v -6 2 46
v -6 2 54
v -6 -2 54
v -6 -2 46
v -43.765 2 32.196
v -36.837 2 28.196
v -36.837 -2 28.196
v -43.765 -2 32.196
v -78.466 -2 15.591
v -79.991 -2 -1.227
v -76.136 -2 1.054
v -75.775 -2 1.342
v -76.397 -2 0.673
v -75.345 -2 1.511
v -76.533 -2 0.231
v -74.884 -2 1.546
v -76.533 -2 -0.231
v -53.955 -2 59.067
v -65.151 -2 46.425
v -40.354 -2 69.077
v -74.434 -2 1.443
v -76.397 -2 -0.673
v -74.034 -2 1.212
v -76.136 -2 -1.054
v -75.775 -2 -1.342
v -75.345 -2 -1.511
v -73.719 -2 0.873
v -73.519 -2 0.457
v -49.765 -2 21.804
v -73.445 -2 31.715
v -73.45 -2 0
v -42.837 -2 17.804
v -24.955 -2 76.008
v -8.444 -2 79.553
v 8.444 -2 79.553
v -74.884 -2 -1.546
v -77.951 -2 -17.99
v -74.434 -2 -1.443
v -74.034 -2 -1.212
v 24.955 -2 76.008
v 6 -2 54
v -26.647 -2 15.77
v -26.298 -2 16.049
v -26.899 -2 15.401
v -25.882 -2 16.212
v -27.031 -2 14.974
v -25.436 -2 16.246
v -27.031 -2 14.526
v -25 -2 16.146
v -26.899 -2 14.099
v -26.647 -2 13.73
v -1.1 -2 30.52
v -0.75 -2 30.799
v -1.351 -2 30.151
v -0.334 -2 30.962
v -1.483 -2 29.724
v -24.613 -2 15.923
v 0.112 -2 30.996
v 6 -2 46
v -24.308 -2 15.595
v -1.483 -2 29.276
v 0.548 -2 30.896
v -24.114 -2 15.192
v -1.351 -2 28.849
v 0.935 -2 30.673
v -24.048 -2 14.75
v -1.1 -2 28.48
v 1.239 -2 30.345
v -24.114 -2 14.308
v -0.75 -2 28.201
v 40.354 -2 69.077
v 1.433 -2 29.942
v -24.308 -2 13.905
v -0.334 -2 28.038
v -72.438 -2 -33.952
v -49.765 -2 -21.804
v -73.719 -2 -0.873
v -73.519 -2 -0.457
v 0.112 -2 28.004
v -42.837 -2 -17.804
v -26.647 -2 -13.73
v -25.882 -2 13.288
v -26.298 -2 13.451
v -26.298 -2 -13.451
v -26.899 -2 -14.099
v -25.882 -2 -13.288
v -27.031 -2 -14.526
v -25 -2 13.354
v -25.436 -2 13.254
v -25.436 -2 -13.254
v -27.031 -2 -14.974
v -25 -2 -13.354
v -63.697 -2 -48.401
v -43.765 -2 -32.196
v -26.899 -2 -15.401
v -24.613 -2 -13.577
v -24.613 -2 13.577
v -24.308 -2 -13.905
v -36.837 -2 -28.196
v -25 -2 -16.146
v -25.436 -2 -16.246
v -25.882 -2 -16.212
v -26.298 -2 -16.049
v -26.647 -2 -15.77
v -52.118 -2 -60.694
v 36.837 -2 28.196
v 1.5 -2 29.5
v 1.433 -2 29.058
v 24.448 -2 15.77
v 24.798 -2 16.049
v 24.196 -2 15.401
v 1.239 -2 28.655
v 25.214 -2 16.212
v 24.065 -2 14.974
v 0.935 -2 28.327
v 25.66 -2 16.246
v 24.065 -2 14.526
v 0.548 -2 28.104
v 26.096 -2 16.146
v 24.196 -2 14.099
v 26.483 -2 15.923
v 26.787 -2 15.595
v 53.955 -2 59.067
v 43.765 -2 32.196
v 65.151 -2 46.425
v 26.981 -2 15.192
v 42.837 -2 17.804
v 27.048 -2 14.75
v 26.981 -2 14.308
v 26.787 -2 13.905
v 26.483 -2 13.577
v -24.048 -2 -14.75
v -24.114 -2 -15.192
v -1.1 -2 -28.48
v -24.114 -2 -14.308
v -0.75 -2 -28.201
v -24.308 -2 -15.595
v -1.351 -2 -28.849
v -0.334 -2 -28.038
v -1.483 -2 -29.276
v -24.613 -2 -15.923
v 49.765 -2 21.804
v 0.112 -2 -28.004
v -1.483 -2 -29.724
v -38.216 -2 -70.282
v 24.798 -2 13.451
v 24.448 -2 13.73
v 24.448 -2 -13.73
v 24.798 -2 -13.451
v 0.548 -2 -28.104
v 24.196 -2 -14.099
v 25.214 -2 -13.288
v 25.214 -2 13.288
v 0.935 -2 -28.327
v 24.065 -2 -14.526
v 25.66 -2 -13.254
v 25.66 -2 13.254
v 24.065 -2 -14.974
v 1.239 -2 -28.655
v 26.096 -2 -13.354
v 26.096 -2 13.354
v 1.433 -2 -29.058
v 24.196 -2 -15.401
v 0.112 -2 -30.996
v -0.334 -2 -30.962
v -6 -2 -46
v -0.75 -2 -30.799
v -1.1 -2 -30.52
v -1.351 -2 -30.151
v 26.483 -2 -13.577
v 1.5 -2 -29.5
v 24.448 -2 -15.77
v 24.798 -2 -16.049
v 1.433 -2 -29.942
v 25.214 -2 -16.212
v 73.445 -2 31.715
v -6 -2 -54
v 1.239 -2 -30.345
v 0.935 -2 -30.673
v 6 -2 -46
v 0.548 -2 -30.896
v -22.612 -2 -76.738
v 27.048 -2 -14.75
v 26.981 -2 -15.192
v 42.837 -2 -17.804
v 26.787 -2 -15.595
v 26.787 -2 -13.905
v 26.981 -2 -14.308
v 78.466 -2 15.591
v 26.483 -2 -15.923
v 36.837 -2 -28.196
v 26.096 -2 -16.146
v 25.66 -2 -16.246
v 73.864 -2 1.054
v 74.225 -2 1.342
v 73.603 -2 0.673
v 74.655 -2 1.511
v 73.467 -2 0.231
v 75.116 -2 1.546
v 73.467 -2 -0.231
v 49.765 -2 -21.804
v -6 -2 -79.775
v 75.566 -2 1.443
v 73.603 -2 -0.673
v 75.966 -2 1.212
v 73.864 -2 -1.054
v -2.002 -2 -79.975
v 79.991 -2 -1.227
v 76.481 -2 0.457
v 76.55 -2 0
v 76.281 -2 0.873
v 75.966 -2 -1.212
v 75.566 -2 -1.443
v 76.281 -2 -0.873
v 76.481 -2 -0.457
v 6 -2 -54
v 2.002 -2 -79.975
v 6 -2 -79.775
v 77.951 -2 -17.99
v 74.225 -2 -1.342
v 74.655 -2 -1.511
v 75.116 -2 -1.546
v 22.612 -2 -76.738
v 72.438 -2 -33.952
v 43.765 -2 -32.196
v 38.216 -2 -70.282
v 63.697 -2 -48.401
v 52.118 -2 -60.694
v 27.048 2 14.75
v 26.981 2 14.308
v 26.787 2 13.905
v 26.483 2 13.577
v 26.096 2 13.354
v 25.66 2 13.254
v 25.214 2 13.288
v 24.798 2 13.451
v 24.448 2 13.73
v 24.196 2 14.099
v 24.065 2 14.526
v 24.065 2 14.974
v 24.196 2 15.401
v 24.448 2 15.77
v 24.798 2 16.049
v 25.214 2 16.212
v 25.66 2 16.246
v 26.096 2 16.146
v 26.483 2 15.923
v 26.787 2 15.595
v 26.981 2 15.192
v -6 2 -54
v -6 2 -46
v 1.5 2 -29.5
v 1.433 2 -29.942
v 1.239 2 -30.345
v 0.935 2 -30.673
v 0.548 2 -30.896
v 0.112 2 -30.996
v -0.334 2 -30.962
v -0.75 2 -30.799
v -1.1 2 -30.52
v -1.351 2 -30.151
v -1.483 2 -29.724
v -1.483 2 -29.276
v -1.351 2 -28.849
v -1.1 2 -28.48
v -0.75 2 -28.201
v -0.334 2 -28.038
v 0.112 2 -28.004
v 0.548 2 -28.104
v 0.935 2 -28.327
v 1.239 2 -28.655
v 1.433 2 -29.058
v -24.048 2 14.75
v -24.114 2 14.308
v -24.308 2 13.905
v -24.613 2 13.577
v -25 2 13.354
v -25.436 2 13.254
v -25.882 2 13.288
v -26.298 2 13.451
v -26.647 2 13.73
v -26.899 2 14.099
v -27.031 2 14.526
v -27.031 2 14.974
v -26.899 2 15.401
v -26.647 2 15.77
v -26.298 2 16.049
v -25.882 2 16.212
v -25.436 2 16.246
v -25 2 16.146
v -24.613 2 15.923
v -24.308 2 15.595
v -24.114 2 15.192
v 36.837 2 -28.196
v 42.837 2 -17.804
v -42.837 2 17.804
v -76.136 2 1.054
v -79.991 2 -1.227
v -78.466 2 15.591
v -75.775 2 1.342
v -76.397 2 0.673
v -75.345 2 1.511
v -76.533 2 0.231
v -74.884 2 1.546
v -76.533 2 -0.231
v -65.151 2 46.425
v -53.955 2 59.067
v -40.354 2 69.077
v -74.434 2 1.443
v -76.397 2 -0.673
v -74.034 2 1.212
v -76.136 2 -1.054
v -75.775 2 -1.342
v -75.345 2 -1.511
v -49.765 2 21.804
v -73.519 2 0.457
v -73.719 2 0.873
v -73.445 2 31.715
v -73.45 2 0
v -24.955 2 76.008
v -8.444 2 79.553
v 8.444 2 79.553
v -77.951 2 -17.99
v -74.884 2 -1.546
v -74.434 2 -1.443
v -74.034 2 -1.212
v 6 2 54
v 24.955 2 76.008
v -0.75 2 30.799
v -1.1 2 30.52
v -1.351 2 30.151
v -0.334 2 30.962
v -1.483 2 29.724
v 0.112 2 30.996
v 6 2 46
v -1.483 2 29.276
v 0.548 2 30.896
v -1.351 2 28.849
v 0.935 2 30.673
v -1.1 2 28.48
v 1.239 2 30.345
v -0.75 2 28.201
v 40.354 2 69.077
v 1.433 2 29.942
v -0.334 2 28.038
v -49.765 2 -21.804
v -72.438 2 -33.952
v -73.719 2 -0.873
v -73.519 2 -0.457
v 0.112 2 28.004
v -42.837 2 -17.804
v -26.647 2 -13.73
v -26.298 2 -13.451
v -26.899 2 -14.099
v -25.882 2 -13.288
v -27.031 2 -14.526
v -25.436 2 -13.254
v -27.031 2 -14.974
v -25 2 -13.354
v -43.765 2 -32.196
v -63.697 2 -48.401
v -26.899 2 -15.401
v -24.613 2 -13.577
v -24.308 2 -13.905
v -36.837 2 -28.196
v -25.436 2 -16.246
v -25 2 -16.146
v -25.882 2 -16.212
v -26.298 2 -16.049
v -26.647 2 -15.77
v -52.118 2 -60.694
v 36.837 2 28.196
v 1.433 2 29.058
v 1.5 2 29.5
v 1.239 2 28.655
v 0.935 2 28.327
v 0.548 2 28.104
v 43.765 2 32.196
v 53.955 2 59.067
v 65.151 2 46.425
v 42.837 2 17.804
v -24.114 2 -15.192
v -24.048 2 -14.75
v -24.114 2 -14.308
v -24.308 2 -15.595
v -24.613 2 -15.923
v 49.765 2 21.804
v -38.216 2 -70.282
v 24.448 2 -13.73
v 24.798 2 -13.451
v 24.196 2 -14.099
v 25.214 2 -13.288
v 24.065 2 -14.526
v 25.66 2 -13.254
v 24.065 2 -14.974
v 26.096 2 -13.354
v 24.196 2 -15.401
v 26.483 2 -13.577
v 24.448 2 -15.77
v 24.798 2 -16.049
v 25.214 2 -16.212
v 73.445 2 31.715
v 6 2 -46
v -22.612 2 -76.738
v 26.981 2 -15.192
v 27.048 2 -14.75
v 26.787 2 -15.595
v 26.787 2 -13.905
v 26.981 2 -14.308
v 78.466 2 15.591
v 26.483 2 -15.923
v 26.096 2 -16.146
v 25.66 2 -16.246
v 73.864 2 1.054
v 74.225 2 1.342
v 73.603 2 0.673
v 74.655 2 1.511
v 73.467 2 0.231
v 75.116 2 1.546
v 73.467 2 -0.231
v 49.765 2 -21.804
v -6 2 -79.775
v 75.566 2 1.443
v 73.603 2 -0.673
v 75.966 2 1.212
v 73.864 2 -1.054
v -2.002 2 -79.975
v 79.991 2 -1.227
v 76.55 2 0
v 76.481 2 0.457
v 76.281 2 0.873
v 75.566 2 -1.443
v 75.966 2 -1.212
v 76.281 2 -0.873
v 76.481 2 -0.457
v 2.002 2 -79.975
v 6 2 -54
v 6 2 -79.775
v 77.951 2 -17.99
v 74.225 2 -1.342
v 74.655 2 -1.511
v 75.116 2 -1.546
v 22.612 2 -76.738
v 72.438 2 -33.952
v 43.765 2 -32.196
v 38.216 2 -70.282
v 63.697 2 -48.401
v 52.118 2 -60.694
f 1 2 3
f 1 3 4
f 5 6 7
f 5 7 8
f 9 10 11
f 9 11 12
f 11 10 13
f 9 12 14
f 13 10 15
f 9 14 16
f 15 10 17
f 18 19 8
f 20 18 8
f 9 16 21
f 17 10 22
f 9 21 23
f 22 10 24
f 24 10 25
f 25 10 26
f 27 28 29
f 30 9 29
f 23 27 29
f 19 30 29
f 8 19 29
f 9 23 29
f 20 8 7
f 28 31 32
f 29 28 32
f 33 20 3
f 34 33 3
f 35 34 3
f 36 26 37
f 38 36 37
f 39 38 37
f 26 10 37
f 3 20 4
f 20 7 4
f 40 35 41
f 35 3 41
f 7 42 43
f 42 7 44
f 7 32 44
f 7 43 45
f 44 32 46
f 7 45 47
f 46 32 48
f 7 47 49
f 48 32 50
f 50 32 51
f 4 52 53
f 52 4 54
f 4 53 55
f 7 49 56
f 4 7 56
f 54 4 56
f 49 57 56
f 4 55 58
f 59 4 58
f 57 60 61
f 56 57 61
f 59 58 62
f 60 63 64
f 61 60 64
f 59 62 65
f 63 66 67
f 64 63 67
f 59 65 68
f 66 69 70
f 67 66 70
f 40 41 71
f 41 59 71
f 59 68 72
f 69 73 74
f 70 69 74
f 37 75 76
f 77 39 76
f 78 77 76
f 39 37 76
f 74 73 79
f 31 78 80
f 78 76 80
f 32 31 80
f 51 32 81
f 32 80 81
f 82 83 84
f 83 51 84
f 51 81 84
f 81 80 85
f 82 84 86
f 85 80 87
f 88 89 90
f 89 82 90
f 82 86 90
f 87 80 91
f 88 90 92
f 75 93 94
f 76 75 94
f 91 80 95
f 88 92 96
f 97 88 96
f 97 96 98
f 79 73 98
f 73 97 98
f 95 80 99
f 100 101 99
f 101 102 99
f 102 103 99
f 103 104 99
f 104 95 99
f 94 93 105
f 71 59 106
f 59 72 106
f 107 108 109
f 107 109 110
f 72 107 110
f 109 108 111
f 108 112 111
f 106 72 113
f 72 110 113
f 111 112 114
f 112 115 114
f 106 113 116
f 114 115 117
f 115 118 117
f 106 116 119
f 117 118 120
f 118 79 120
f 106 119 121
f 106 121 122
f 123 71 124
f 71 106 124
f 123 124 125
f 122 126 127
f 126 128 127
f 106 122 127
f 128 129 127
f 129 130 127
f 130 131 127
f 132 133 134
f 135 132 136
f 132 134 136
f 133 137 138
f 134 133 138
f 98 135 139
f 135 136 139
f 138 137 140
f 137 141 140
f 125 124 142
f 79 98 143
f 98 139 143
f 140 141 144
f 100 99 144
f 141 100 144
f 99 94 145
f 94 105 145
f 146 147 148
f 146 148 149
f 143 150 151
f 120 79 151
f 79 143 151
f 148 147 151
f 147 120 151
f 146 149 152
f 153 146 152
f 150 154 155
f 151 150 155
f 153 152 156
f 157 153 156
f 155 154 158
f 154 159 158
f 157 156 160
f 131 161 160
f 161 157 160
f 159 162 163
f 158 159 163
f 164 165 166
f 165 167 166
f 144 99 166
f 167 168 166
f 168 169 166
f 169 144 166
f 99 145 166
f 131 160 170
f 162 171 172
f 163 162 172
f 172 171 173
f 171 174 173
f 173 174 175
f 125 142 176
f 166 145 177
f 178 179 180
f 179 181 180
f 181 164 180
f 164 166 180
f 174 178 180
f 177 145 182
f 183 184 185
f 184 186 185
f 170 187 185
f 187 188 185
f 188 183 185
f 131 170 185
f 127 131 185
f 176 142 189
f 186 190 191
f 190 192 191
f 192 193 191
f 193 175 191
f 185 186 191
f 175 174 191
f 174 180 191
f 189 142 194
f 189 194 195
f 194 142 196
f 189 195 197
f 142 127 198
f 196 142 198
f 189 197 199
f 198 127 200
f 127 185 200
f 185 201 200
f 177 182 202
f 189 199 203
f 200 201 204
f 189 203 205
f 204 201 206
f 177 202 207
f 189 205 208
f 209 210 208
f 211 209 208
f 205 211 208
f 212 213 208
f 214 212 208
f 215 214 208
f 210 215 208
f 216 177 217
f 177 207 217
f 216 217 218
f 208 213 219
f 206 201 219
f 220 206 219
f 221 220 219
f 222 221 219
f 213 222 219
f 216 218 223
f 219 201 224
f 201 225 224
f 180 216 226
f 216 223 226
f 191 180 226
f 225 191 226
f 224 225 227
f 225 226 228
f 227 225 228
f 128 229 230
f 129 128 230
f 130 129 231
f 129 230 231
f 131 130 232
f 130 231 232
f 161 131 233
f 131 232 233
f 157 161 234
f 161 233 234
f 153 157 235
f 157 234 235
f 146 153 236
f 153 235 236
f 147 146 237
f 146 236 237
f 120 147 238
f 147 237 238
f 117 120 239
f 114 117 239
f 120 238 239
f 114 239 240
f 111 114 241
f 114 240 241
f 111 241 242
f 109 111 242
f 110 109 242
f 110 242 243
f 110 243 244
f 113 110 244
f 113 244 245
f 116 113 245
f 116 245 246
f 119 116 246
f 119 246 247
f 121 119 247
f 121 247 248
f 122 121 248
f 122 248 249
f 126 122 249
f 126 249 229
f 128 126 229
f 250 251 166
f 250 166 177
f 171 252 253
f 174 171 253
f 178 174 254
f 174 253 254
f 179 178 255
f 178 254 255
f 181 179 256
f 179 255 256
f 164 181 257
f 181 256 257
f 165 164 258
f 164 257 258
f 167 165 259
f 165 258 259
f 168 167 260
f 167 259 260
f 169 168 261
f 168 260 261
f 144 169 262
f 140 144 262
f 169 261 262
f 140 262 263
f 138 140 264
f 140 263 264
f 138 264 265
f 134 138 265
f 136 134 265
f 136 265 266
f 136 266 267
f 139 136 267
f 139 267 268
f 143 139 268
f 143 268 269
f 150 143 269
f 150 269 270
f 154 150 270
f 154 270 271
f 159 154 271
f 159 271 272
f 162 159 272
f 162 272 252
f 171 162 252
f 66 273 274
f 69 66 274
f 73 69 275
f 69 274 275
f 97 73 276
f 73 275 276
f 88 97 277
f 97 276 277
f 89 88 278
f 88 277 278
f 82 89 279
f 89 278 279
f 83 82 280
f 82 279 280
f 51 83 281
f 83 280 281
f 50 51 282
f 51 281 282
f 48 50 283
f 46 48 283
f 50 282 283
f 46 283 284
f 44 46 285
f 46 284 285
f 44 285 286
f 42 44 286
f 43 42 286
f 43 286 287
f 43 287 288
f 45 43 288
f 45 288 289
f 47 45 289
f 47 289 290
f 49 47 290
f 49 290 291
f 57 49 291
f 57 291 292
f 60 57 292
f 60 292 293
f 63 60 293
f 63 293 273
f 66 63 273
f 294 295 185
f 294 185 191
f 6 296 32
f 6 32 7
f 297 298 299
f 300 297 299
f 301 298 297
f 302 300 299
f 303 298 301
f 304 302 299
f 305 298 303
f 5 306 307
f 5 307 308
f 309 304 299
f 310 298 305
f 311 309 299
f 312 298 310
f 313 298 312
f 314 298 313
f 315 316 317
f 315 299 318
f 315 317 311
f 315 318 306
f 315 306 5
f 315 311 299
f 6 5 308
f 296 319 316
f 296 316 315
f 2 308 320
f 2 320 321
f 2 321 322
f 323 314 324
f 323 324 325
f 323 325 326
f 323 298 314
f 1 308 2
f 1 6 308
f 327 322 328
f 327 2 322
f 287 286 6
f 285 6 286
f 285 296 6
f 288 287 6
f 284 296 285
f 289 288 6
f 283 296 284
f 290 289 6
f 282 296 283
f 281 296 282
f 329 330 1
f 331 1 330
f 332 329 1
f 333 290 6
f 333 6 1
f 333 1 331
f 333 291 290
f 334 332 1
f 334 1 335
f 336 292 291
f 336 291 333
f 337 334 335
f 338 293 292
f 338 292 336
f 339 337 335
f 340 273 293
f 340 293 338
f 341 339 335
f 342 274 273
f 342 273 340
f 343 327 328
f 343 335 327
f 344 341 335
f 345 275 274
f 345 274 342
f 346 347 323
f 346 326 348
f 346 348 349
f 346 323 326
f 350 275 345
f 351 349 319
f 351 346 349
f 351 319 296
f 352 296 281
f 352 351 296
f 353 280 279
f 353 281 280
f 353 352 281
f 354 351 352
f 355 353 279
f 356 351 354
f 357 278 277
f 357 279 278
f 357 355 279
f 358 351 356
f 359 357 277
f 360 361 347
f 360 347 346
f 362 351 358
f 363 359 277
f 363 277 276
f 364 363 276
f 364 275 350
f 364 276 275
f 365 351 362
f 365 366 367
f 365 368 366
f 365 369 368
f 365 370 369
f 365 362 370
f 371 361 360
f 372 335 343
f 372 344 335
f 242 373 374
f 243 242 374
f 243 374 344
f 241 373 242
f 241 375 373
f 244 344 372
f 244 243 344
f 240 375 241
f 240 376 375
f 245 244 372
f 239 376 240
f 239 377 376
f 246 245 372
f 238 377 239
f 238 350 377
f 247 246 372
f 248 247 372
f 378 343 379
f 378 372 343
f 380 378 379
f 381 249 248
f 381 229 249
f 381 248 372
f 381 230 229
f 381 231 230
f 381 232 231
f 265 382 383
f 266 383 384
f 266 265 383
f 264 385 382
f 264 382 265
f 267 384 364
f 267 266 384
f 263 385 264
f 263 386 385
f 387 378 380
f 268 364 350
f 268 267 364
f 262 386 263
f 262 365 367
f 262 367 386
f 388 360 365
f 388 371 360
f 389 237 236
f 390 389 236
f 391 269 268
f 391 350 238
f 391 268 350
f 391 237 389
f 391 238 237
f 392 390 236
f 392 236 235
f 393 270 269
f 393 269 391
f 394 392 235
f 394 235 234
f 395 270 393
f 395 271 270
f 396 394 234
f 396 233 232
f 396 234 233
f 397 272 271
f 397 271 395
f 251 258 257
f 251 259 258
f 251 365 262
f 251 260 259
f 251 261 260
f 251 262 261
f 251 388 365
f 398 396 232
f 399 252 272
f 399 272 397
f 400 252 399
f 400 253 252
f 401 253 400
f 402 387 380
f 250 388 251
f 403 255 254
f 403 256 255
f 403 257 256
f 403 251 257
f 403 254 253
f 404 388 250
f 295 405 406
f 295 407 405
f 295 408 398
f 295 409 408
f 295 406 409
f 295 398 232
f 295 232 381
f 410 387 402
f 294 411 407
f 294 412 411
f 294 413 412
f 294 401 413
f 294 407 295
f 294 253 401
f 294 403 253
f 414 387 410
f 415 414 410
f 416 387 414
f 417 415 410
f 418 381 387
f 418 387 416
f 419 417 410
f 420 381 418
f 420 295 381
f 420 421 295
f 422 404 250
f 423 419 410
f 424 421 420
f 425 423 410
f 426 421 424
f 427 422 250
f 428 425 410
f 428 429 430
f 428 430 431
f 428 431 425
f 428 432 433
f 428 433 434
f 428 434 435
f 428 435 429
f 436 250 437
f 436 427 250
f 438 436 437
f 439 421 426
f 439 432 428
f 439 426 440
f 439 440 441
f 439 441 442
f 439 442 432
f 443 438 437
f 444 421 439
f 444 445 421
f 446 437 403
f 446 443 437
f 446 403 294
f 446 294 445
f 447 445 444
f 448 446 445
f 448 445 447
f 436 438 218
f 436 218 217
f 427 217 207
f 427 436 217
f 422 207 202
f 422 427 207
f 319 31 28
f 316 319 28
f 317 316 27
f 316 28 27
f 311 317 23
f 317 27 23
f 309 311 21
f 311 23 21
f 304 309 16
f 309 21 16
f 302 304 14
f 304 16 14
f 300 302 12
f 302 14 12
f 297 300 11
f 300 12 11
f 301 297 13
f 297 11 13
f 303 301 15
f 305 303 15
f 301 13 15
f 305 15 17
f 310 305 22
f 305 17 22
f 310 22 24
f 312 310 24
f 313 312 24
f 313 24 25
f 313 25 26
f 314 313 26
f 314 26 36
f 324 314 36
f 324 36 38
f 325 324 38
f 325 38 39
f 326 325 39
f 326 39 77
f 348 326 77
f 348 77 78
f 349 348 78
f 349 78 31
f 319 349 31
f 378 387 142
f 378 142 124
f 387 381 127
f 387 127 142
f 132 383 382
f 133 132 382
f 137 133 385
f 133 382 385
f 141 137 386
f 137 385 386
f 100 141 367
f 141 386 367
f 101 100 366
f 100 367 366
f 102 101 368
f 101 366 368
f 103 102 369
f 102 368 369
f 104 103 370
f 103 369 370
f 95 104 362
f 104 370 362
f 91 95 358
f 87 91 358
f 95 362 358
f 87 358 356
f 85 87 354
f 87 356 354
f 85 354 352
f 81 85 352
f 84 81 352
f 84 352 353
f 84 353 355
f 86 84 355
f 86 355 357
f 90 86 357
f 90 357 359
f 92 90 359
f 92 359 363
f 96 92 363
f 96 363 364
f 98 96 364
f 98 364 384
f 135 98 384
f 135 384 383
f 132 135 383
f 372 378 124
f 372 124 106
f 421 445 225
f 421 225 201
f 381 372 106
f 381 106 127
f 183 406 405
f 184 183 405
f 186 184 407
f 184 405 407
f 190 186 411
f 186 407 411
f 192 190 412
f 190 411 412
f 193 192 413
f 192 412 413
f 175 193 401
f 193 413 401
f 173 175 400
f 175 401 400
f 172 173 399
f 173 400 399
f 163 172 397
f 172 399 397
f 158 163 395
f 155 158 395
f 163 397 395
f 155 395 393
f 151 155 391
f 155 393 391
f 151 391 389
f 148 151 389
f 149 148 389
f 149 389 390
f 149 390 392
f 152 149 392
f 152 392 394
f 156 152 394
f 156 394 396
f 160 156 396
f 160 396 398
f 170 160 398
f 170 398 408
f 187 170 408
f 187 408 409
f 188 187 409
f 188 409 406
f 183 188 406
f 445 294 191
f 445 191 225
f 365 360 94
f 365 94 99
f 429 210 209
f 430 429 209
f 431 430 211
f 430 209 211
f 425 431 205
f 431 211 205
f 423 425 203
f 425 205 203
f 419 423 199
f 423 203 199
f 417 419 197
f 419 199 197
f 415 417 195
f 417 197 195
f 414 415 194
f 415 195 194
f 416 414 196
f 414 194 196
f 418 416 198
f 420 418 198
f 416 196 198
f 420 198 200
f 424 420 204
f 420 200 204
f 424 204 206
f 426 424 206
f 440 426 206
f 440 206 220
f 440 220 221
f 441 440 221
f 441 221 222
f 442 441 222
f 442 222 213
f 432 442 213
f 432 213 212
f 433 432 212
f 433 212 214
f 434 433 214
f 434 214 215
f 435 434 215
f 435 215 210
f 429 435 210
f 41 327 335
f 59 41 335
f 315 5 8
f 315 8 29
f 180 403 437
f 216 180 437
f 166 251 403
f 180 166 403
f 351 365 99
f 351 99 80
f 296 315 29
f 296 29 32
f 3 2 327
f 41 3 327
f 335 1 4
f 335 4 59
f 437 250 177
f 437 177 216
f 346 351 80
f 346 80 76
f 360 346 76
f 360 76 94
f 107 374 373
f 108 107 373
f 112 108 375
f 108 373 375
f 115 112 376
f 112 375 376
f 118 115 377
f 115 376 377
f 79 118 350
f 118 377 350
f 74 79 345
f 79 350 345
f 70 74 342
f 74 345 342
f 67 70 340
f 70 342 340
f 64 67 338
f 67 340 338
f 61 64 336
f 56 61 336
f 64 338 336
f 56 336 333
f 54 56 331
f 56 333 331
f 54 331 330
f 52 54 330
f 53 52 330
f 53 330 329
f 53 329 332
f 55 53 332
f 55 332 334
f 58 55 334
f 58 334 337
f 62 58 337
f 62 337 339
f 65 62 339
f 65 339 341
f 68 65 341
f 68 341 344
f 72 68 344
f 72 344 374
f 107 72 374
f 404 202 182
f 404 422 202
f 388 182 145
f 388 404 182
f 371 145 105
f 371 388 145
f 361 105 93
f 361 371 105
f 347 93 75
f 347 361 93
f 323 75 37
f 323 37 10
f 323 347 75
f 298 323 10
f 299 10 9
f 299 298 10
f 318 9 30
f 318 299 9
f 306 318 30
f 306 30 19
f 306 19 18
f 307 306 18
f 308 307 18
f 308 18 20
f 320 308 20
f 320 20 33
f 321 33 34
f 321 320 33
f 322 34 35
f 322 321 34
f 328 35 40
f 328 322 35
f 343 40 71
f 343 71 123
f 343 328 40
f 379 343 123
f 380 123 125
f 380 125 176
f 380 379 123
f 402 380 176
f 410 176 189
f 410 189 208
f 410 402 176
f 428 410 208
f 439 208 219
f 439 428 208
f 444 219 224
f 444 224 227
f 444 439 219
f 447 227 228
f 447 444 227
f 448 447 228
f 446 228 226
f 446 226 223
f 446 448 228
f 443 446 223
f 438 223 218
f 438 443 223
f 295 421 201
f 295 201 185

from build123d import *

# Parameters (mm, degrees)
BOSS_EXTRUDE1_DEPTH = 2
SKETCH2_R           = 1.55
CUT_EXTRUDE1_DEPTH  = 5
SKETCH3_W           = 12
SKETCH3_H           = 8
CUT_EXTRUDE2_DEPTH  = 5
SKETCH4_R           = 1.5
CUT_EXTRUDE4_DEPTH  = 10


with BuildPart() as part:
    # Sketch1 → Boss-Extrude1 (new body, symmetric)
    with BuildSketch(Plane(origin=(0, 0, 0), x_dir=(1, 0, 0), z_dir=(0, 1, 0))):
        with BuildLine():
            ThreePointArc((-6, 79.774682701), (0, -80), (6, 79.774682701))
            ThreePointArc((6, 79.774682701), (0, 80), (-6, 79.774682701))
        make_face()
    extrude(amount=BOSS_EXTRUDE1_DEPTH, both=True)

    # Sketch2 → Cut-Extrude1 (cut, through all)
    with BuildSketch(Plane.XZ.offset(2)):
        with Locations((75, 0)):
            Circle(SKETCH2_R)
        with Locations((-75, 0)):
            Circle(SKETCH2_R)
    extrude(amount=-CUT_EXTRUDE1_DEPTH, mode=Mode.SUBTRACT)

    # Sketch3 → Cut-Extrude2 (cut, through all)
    with BuildSketch(Plane(origin=(0, 2, 0), x_dir=(1, 0, 0), z_dir=(0, 1, 0))):
        Polygon((43.765371804, 32.196152423), (49.765371804, 21.803847577), (42.837168574, 17.803847577), (36.837168574, 28.196152423), align=None)
        with Locations((0, 50)):
            Rectangle(SKETCH3_W, SKETCH3_H)
        Polygon((49.765371804, -21.803847577), (43.765371804, -32.196152423), (36.837168574, -28.196152423), (42.837168574, -17.803847577), align=None)
        with Locations((0, -50)):
            Rectangle(SKETCH3_W, SKETCH3_H)
        Polygon((-43.765371804, -32.196152423), (-49.765371804, -21.803847577), (-42.837168574, -17.803847577), (-36.837168574, -28.196152423), align=None)
        Polygon((-49.765371804, 21.803847577), (-43.765371804, 32.196152423), (-36.837168574, 28.196152423), (-42.837168574, 17.803847577), align=None)
    extrude(amount=-CUT_EXTRUDE2_DEPTH, mode=Mode.SUBTRACT)

    # Sketch4 → Cut-Extrude4 (cut)
    with BuildSketch(Plane(origin=(0, 2, 0), x_dir=(1, 0, 0), z_dir=(0, 1, 0))):
        with Locations((0, -29.5)):
            Circle(SKETCH4_R)
        with Locations((-25.547749412, 14.75)):
            Circle(SKETCH4_R)
        with Locations((-25.547749412, -14.75)):
            Circle(SKETCH4_R)
        with Locations((25.547749412, -14.75)):
            Circle(SKETCH4_R)
        with Locations((25.547749412, 14.75)):
            Circle(SKETCH4_R)
        with Locations((0, 29.5)):
            Circle(SKETCH4_R)
    extrude(amount=-CUT_EXTRUDE4_DEPTH, mode=Mode.SUBTRACT)


solid = part.part
